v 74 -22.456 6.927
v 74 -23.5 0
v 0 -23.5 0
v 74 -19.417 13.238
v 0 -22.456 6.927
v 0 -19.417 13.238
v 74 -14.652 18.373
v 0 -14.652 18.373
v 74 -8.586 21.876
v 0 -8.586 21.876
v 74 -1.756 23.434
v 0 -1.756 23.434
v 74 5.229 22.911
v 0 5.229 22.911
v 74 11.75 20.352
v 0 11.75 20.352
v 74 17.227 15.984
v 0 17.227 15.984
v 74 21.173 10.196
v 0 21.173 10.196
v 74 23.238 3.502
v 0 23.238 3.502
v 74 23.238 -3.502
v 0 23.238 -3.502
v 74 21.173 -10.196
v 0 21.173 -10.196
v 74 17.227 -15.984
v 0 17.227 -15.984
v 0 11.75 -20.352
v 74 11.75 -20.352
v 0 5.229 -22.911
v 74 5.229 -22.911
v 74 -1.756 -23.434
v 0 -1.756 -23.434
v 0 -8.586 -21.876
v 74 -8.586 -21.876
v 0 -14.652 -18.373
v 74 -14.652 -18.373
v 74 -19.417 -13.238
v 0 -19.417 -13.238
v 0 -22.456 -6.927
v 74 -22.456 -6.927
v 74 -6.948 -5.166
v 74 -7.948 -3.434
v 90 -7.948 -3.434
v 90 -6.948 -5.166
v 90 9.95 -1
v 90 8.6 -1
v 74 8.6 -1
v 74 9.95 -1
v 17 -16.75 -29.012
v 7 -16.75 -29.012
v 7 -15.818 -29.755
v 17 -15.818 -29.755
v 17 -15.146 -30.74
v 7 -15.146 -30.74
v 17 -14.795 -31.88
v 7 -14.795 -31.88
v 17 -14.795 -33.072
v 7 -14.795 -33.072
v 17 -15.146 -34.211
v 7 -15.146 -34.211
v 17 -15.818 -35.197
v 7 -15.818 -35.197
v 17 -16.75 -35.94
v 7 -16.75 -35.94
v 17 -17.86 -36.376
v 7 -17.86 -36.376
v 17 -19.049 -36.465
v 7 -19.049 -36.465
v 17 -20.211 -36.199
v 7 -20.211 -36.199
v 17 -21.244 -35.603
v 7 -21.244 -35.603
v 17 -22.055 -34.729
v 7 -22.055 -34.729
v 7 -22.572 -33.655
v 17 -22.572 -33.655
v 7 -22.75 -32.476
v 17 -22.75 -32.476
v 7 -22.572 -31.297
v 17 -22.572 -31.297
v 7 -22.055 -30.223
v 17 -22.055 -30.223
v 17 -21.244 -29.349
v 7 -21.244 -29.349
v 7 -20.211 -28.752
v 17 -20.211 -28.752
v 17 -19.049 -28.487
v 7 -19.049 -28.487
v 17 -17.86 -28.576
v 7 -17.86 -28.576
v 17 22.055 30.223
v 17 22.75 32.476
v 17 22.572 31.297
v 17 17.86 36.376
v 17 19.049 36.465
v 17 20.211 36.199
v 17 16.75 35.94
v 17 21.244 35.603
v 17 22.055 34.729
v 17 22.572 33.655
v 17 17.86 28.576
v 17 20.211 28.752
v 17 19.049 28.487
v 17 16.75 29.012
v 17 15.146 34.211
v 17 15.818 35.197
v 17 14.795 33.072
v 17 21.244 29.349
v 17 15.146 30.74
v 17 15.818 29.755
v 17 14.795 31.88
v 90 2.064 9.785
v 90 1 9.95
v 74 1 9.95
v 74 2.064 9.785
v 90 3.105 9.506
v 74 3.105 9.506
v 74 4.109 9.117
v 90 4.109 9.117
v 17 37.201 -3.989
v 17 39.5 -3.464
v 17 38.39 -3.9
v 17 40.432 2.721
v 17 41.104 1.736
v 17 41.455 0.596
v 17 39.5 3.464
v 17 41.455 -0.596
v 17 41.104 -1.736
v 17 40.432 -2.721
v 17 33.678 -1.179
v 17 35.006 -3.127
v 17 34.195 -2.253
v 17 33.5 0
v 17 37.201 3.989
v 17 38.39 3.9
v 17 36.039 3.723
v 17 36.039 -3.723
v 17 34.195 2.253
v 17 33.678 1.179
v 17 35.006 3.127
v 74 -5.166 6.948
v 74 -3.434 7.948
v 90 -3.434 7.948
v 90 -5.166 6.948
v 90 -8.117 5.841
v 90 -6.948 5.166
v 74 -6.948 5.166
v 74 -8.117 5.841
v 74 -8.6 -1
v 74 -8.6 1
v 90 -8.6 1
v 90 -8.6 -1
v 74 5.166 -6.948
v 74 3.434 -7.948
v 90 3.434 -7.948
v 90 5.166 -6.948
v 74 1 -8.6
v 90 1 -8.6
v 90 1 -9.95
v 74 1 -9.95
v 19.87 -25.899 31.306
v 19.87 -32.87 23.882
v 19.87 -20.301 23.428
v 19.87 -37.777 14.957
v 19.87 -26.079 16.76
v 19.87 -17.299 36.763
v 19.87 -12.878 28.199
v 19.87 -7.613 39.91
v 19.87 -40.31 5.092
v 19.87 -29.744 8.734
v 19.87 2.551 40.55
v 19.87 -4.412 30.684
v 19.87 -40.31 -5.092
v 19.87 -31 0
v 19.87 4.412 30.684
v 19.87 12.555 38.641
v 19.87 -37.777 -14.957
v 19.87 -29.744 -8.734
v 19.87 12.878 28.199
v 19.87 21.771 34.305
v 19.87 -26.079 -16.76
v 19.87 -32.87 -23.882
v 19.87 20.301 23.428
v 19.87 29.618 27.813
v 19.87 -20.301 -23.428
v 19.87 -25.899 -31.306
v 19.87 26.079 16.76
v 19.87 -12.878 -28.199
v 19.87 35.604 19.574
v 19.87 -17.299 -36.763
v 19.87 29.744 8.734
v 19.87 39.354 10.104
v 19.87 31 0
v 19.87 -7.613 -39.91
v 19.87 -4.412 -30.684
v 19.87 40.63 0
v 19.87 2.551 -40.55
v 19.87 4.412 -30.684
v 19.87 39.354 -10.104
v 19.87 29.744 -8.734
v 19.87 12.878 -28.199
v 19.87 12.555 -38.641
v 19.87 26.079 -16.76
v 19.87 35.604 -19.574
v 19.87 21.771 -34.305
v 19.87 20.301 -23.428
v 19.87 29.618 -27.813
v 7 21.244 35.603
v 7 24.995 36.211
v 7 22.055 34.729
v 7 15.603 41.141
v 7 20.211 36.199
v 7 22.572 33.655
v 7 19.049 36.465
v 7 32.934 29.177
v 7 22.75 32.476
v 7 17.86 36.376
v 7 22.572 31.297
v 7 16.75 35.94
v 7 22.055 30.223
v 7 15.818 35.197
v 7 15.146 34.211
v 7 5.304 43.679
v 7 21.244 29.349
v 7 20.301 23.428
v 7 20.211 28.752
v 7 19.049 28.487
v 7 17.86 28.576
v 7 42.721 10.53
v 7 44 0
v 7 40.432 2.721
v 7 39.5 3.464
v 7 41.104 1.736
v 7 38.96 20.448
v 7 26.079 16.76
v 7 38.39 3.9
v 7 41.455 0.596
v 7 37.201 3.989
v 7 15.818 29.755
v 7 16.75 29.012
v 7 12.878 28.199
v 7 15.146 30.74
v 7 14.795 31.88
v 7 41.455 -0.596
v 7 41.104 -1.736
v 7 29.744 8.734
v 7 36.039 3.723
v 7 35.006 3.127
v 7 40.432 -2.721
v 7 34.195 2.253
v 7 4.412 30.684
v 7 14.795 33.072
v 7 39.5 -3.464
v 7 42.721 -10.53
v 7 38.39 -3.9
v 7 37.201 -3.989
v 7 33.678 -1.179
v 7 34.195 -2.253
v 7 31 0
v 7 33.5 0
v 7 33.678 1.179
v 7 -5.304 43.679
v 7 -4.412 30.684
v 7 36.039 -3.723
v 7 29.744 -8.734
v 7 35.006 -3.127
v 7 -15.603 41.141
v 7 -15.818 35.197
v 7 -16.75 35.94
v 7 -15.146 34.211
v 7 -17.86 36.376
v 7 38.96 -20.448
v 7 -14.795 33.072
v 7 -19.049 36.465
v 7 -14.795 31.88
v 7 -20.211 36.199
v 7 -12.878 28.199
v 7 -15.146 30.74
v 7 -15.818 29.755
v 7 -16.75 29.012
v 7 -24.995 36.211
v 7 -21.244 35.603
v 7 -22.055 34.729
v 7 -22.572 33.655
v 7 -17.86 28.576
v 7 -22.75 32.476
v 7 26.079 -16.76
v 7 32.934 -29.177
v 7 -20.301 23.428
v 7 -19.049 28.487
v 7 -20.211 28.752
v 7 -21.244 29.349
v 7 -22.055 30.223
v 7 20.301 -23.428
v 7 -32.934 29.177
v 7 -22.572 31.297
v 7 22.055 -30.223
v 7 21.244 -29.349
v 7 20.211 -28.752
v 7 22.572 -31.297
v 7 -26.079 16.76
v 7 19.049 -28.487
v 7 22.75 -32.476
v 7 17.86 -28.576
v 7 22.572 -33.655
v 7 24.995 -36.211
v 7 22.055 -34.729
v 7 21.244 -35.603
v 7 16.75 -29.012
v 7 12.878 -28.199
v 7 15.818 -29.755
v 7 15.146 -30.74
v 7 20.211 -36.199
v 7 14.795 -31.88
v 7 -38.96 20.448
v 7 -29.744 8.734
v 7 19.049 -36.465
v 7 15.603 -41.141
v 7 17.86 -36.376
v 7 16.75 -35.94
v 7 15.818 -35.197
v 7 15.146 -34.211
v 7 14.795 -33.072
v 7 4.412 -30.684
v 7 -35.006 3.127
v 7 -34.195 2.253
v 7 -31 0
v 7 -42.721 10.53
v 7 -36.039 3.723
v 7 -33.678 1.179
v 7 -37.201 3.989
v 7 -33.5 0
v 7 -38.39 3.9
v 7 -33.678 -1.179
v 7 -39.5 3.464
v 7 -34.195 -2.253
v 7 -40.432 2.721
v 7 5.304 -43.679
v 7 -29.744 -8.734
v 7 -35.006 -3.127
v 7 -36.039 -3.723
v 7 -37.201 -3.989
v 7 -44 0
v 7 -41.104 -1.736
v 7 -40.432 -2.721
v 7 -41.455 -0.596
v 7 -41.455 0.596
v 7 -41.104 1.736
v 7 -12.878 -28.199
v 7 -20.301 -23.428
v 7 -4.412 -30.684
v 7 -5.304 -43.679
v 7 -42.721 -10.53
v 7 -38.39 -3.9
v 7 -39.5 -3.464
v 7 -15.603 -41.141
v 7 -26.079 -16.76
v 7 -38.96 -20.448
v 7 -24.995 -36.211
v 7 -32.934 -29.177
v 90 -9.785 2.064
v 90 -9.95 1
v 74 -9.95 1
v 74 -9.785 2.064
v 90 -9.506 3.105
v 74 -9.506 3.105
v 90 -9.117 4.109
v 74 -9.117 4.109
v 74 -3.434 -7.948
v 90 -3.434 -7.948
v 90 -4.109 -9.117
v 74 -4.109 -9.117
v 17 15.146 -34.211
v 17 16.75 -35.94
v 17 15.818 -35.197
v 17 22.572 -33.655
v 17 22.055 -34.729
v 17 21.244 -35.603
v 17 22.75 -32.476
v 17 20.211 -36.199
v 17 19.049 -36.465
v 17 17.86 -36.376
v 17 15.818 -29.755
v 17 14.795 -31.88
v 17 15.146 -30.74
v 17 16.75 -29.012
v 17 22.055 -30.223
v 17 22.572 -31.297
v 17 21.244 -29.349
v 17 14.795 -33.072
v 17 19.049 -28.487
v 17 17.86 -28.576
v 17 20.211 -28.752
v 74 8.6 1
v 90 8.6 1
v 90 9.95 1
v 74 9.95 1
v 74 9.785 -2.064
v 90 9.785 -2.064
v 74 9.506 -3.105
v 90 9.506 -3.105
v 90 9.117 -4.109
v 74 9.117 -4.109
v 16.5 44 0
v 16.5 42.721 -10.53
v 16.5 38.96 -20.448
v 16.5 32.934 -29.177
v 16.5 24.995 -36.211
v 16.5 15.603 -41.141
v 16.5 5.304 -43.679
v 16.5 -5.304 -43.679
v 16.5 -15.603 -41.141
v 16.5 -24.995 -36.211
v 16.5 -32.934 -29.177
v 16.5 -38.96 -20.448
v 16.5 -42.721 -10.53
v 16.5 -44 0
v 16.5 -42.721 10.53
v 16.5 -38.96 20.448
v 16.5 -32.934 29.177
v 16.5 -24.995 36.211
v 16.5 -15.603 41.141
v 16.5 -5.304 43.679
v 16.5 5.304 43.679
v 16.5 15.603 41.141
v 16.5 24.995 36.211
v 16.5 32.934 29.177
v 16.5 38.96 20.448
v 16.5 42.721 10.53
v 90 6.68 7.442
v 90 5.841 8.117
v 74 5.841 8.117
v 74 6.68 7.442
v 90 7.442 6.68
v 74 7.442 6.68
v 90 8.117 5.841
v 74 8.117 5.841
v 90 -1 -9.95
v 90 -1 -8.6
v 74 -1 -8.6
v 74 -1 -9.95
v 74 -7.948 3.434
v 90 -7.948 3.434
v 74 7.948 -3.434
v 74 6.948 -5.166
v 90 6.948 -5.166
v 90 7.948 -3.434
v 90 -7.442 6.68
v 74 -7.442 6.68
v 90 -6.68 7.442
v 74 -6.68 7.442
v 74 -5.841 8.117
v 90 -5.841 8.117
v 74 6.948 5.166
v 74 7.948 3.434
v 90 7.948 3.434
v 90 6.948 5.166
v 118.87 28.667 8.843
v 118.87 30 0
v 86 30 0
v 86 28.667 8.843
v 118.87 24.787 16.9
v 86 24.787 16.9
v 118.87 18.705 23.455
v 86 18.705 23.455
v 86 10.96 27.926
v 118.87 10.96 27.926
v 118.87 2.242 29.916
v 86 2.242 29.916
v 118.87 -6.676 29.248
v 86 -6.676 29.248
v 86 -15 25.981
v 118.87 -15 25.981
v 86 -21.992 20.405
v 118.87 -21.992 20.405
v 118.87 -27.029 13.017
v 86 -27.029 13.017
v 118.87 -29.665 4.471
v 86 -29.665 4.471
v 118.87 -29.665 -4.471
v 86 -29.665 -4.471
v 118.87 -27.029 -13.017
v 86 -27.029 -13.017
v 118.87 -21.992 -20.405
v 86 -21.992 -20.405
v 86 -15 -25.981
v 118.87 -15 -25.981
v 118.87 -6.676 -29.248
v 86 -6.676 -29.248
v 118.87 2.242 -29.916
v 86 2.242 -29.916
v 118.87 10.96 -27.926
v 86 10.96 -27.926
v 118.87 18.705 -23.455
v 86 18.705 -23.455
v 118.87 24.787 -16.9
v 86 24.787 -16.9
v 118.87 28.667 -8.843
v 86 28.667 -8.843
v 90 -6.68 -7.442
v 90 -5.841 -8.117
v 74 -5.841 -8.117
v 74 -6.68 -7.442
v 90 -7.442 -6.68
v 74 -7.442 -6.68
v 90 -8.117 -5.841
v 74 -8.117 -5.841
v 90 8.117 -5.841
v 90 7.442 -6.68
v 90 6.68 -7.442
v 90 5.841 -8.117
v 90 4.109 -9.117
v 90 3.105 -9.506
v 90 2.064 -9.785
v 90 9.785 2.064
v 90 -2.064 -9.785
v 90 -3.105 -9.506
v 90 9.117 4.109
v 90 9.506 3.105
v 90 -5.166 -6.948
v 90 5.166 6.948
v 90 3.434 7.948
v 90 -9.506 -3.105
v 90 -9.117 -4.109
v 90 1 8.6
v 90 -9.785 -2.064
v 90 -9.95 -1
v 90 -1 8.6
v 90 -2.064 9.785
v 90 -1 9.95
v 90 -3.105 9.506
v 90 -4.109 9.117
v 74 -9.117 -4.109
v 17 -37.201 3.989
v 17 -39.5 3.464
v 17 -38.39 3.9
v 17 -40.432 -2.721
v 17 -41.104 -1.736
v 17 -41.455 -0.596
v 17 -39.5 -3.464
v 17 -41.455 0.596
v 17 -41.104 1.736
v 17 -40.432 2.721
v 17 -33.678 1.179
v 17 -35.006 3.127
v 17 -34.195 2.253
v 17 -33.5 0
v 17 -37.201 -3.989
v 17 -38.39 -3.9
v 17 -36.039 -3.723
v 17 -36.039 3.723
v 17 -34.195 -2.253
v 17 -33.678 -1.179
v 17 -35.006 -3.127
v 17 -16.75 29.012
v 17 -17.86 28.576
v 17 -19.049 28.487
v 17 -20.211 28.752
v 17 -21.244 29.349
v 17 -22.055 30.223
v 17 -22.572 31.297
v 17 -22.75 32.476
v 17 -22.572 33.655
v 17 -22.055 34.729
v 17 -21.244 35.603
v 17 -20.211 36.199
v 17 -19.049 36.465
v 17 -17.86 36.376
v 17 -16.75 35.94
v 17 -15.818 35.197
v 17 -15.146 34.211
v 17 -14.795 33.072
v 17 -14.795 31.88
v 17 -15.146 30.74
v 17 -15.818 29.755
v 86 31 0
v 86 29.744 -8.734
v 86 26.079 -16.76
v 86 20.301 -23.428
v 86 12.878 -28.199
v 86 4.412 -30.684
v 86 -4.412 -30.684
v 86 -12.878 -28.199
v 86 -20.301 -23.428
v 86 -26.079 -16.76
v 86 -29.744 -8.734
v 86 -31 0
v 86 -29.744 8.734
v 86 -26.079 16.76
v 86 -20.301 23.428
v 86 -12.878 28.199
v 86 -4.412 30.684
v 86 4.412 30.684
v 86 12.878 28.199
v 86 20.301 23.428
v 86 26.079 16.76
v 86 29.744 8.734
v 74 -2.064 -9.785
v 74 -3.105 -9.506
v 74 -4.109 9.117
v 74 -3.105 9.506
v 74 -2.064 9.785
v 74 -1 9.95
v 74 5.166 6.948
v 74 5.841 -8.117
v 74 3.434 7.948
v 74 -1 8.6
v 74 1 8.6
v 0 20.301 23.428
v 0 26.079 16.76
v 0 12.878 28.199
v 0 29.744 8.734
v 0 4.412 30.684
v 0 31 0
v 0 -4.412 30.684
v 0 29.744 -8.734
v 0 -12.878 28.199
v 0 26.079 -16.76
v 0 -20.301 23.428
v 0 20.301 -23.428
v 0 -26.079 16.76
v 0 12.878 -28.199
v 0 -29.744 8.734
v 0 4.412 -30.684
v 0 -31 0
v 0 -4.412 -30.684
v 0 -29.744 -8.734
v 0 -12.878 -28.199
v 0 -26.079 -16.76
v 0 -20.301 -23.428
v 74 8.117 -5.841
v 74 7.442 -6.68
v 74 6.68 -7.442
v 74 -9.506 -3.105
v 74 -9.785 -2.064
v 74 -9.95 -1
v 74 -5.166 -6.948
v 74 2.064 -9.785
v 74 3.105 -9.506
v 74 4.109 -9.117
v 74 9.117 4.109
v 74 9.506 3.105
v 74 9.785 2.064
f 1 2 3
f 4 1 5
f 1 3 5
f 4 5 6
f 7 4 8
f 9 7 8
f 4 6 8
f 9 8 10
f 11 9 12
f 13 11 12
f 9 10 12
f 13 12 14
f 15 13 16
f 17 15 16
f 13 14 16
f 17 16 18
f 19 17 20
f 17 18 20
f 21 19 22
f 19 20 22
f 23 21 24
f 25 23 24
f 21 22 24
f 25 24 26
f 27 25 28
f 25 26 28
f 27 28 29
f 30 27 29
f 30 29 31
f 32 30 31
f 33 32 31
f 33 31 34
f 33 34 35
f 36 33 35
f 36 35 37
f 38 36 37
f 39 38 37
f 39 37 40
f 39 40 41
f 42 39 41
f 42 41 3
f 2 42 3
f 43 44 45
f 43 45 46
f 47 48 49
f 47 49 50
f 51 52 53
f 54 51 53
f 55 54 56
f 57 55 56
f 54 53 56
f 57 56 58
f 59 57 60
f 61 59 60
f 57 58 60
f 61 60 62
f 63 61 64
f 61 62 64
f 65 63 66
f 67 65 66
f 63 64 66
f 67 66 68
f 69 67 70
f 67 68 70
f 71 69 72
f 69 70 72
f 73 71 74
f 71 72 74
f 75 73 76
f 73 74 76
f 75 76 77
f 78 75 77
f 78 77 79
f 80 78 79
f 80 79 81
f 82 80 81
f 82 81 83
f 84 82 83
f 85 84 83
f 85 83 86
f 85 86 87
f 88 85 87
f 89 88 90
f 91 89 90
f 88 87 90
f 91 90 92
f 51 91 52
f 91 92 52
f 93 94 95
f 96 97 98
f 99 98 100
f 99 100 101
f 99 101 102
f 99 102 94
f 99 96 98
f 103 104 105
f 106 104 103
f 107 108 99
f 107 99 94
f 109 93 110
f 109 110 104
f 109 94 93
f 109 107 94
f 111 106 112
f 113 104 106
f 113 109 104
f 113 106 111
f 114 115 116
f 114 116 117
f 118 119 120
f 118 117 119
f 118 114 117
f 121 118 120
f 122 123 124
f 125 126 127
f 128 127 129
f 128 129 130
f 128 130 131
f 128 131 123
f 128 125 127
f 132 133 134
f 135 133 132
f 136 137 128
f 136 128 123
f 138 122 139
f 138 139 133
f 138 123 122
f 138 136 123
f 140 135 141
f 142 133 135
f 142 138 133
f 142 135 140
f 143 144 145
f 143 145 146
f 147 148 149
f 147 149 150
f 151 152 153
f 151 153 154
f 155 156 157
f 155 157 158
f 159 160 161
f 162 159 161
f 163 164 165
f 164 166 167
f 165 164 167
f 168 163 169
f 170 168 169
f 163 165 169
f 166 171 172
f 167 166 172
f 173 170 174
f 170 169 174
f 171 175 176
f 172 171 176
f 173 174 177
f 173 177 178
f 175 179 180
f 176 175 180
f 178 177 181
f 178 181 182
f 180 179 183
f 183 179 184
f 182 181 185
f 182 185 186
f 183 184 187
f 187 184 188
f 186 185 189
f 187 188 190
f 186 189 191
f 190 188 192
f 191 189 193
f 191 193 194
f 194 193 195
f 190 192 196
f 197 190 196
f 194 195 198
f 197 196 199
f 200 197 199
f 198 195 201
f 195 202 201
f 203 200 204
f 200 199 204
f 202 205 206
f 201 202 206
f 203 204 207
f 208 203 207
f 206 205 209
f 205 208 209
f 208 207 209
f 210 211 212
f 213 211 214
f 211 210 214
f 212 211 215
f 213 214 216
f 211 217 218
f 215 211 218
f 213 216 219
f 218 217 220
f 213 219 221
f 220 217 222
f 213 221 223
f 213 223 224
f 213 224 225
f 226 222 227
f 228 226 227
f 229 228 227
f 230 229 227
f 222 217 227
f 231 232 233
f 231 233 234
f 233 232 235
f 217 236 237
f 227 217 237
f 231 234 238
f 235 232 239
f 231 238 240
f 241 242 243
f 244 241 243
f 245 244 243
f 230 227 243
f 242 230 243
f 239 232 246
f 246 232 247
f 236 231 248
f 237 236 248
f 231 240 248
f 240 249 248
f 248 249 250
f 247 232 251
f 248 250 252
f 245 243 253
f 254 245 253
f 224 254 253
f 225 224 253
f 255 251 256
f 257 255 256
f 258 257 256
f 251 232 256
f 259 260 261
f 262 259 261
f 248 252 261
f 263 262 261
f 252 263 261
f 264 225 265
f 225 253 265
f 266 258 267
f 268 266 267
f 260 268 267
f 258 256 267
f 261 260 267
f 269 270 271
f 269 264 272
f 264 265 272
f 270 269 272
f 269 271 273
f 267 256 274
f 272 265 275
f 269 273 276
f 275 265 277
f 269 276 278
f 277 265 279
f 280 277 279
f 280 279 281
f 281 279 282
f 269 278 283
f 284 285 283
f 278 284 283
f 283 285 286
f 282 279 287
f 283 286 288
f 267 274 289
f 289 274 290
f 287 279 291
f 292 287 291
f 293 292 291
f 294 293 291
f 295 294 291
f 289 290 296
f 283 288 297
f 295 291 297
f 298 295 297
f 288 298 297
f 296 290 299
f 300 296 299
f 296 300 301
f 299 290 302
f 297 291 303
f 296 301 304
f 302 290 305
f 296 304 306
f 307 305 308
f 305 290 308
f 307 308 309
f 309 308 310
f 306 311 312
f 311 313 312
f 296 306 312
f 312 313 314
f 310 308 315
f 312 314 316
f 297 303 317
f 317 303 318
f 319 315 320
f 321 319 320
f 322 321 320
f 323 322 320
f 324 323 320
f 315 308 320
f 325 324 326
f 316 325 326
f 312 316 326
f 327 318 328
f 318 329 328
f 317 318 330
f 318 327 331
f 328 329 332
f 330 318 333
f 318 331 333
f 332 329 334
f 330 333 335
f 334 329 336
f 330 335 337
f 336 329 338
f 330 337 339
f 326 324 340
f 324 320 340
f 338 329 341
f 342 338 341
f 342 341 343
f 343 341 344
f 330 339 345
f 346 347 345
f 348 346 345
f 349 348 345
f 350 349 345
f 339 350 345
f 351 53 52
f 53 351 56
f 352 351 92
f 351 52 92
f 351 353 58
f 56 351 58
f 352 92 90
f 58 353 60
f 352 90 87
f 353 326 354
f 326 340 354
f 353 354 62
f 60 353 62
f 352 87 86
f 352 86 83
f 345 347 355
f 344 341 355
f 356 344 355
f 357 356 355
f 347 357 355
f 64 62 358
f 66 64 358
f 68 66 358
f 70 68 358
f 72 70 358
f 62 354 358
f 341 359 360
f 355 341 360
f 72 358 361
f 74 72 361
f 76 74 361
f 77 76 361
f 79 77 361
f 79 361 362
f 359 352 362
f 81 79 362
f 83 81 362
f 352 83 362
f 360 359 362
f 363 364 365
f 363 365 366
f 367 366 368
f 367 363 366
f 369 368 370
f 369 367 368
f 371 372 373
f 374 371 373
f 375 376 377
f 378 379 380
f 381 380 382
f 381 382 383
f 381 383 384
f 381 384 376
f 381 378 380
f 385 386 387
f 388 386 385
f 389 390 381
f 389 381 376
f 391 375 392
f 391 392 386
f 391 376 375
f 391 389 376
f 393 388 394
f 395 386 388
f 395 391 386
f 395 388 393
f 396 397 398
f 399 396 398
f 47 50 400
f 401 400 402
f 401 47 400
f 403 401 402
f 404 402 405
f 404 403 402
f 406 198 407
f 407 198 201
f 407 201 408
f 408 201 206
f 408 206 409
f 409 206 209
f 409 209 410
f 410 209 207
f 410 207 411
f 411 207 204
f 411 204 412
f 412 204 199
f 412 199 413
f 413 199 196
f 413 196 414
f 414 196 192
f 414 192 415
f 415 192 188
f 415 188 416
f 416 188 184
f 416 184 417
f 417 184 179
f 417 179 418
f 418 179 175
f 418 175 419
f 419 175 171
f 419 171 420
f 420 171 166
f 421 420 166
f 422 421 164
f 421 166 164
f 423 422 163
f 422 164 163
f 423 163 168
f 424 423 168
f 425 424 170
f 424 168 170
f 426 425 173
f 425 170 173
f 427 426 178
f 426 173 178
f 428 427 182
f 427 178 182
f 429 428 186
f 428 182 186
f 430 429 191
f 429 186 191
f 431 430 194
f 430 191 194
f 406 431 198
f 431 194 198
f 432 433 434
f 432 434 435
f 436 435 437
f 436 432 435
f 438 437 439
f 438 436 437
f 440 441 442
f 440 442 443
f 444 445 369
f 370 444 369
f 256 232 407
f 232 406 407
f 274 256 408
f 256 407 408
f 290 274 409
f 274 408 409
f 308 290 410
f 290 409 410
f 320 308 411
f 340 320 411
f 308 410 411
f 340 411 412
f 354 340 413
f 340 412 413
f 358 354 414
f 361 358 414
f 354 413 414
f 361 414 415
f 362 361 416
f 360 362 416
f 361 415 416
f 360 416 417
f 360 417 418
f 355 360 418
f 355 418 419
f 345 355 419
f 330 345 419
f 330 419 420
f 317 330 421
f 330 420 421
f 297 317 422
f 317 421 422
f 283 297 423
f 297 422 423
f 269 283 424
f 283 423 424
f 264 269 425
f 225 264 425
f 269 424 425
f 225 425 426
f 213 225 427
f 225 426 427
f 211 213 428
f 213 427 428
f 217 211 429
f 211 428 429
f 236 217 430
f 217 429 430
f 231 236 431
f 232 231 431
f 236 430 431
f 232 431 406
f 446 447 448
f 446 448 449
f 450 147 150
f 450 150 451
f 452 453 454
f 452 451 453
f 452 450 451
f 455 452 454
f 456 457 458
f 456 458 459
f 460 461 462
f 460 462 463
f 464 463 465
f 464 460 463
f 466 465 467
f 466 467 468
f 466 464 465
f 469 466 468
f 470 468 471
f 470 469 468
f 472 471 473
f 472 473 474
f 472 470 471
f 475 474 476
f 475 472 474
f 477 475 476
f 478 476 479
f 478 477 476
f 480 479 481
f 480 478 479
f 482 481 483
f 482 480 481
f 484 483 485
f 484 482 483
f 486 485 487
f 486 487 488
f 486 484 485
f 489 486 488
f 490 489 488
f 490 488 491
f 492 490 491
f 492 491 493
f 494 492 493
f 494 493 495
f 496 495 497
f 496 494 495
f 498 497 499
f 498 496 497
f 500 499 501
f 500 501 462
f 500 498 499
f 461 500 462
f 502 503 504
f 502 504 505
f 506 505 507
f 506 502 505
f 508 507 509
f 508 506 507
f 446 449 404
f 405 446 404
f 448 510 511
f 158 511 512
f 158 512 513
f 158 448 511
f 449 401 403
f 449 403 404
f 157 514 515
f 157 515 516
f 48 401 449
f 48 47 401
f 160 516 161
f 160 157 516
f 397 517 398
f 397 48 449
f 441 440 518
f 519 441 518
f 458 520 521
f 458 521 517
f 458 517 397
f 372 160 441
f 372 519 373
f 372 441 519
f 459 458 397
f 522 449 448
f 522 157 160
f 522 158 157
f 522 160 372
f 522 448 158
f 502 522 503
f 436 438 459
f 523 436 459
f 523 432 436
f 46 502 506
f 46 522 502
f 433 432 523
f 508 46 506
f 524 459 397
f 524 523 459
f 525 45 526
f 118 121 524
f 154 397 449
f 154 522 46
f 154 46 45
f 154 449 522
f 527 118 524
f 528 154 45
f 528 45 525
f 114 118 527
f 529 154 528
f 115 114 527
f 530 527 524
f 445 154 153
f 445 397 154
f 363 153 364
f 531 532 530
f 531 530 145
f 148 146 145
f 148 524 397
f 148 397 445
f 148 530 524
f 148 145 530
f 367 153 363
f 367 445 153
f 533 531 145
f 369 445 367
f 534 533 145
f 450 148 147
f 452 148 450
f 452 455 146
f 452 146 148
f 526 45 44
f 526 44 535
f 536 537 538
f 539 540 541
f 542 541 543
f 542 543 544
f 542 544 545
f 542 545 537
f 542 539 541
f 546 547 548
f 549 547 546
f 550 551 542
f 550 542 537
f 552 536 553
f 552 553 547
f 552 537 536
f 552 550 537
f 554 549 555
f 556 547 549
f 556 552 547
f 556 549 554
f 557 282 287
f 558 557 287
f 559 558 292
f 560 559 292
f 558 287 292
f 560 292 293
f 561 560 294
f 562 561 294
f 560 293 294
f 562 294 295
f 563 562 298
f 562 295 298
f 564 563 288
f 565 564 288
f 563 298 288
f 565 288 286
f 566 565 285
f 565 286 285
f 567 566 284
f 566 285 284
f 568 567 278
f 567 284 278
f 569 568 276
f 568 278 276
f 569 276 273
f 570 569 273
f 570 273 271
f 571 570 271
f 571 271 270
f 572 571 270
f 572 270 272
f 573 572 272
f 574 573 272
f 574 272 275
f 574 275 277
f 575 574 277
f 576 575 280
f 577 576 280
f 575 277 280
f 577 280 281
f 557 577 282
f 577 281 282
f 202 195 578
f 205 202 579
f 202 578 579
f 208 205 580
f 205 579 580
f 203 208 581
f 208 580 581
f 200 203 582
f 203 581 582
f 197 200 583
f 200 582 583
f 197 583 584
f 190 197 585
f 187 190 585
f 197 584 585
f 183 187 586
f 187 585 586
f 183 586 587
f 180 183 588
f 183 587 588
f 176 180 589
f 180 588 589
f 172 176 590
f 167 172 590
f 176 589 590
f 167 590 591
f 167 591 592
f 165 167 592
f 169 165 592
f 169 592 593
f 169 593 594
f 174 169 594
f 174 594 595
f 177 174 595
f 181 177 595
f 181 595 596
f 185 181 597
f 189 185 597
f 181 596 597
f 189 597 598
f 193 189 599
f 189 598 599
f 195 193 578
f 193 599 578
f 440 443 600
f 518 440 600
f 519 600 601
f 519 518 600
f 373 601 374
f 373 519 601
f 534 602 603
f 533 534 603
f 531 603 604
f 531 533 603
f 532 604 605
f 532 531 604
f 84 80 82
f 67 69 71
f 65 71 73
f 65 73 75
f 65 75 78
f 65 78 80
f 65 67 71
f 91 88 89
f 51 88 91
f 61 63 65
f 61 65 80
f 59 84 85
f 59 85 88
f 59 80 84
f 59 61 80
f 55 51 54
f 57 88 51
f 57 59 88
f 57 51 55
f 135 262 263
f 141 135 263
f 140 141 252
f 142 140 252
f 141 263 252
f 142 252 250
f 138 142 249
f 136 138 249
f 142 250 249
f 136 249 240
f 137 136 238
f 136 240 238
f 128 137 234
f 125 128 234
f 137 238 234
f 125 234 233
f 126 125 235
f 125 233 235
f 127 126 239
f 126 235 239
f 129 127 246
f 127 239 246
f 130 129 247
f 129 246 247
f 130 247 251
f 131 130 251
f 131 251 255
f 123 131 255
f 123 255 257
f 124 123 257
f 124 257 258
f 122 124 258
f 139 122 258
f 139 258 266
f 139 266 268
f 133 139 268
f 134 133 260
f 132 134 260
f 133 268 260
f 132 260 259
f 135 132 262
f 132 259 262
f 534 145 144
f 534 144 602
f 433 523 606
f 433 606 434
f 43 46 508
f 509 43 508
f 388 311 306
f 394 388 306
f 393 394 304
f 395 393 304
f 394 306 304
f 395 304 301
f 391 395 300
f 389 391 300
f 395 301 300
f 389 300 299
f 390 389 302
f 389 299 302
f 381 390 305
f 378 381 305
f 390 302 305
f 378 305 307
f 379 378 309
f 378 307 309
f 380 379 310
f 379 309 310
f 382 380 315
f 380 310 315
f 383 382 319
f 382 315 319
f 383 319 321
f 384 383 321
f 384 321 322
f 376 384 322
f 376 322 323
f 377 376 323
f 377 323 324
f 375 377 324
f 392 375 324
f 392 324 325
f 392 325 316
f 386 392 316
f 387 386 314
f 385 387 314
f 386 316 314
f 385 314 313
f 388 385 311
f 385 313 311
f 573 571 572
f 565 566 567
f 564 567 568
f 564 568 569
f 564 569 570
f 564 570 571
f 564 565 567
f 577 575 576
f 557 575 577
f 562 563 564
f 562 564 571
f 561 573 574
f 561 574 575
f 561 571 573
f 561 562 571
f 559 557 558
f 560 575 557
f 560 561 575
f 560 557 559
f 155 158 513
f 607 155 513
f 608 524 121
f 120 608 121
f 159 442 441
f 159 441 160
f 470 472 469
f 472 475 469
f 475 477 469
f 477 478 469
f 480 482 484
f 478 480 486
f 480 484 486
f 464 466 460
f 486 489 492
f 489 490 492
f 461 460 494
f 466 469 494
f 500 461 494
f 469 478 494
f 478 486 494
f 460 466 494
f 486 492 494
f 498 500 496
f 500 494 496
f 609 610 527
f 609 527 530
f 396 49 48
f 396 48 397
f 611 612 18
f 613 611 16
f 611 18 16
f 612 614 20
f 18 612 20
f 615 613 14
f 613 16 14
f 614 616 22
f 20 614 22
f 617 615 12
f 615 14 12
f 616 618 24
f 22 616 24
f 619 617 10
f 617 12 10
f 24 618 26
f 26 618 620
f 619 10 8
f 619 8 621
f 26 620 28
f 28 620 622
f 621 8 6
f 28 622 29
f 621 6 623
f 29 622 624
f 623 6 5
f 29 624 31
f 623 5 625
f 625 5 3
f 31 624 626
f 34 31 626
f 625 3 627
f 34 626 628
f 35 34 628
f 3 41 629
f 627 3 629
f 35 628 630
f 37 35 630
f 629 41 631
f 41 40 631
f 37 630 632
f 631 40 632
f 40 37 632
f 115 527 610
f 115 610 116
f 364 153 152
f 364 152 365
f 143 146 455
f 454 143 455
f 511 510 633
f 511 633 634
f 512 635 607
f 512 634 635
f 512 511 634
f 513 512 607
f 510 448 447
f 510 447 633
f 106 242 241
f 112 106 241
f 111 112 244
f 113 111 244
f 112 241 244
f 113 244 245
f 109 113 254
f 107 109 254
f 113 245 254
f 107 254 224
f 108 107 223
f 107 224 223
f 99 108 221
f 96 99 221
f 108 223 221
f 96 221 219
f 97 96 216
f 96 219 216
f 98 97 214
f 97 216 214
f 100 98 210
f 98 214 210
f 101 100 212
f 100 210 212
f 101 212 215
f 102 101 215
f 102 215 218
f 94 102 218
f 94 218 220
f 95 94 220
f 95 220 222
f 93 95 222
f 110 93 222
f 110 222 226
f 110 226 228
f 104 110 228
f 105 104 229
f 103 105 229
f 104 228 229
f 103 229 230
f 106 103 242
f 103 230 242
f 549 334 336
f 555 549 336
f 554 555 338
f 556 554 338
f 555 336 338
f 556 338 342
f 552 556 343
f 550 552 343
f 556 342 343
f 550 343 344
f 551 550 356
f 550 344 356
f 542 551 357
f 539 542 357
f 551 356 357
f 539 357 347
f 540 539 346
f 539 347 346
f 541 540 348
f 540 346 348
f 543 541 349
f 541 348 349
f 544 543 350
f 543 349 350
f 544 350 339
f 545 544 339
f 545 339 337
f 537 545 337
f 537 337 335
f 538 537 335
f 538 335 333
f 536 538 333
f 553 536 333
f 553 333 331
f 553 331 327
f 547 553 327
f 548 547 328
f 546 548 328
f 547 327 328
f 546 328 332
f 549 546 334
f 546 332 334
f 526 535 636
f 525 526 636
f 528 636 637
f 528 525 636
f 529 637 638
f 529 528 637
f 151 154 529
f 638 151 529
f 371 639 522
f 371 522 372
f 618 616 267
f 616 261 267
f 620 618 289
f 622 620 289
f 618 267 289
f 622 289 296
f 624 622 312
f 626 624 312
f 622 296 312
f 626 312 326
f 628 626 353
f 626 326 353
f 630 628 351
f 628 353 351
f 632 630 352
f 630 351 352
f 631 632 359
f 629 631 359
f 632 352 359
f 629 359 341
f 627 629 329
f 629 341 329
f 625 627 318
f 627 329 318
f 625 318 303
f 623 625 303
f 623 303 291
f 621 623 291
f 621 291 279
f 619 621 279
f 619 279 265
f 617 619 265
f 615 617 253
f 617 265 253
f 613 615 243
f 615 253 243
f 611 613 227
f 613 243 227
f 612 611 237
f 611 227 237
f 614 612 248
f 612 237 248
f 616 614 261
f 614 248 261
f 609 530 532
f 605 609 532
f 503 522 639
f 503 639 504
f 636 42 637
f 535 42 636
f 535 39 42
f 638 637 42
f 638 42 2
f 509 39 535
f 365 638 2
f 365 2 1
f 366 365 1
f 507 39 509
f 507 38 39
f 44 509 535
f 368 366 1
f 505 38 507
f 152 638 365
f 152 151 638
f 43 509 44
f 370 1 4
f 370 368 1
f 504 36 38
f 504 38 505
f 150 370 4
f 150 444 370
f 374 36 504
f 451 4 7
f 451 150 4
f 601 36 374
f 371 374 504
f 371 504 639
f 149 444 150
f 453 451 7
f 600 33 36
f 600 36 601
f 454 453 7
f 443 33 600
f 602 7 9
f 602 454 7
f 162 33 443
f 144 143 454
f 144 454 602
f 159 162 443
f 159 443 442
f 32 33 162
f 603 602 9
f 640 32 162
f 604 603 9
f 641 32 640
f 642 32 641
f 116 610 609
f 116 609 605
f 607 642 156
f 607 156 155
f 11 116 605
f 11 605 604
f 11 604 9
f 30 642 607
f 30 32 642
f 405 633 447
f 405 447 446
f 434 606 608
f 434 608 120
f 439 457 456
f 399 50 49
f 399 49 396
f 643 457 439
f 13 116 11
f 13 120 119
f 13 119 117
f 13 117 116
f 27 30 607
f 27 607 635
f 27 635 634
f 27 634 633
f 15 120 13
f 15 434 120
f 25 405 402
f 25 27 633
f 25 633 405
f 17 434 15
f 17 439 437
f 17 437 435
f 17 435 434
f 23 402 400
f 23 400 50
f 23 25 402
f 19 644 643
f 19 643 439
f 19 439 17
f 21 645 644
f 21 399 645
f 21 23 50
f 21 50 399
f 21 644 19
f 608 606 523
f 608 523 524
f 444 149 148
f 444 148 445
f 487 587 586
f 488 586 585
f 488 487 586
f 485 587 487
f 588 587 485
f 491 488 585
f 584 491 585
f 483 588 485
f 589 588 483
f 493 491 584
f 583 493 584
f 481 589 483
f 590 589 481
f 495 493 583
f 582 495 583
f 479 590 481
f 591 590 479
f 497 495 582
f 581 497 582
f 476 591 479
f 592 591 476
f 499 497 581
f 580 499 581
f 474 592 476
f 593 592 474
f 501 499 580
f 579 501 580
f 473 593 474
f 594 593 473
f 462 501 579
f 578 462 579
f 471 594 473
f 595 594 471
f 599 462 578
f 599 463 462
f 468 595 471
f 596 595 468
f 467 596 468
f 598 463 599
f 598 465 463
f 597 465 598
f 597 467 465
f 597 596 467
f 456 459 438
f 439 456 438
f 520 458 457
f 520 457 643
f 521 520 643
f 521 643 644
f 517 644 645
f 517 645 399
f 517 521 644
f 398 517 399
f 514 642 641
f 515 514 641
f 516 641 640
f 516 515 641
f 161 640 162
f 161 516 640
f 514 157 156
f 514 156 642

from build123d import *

# Parameters (mm, degrees)
SKETCH3_R           = 4
CUT_EXTRUDE5_DEPTH  = 10
CIRPATTERN1_COUNT   = 6
SKETCH4_R           = 23.5
CUT_EXTRUDE6_DEPTH  = 90
SKETCH5_W           = 16
SKETCH5_H           = 16
BOSS_EXTRUDE1_START = -16
SKETCH6_W           = 2
SKETCH6_H           = 2.4
BOSS_EXTRUDE1_DEPTH = 16
CIRPATTERN2_COUNT   = 12
SKETCH7_R           = 31
SKETCH7_R_2         = 30
CUT_EXTRUDE7_DEPTH  = 32.87


with BuildPart() as part:
    # Sketch1 → Revolve1 (revolve)
    with BuildSketch(Plane.XY):
        Polygon((0, 0), (0, 31), (7, 31), (7, 44), (16.5, 44), (19.87, 40.63), (19.87, 31), (118.87, 31), (118.87, 0), align=None)
    revolve(axis=Axis((118.87, 0, 0), (-1, 0, 0)))

    # Sketch3 → Cut-Extrude5 (cut)
    with BuildSketch(Plane.ZY.offset(-7)):
        with Locations(Location((0, 37.5, 0), (0, 0, 270))):
            Circle(SKETCH3_R)
    cut_extrude5 = extrude(amount=-CUT_EXTRUDE5_DEPTH, mode=Mode.SUBTRACT)

    # CirPattern1: Cut-Extrude5 ×6 about axis
    cirpattern1_axis = Axis((0, 0, 0), (1, 0, 0))
    for i in range(1, CIRPATTERN1_COUNT):
        add(cut_extrude5.rotate(cirpattern1_axis, i * 360 / CIRPATTERN1_COUNT), mode=Mode.SUBTRACT)

    # Sketch4 → Cut-Extrude6 (cut)
    with BuildSketch(Plane.ZY):
        with Locations(Location((0, 0, 0), (0, 0, 270))):
            Circle(SKETCH4_R)
    extrude(amount=-CUT_EXTRUDE6_DEPTH, mode=Mode.SUBTRACT)

    # Sketch5 → Revolve2 (revolve)
    with BuildSketch(Plane.XY, mode=Mode.PRIVATE) as revolve2_sk:
        with Locations((82, 18)):
            Rectangle(SKETCH5_W, SKETCH5_H)
    revolve(revolve2_sk.sketch.rotate(Axis((118.87, 0, 0), (-1, 0, 0)), 180), axis=Axis((118.87, 0, 0), (-1, 0, 0)))

    # Sketch6 → Boss-Extrude1 (add)
    with BuildSketch(Plane.ZY.offset(-74).offset(BOSS_EXTRUDE1_START)):
        with Locations((0, 9.8)):
            Rectangle(SKETCH6_W, SKETCH6_H)
    boss_extrude1 = extrude(amount=BOSS_EXTRUDE1_DEPTH)

    # CirPattern2: Boss-Extrude1 ×12 about axis
    cirpattern2_axis = Axis((0, 0, 0), (1, 0, 0))
    for i in range(1, CIRPATTERN2_COUNT):
        add(boss_extrude1.rotate(cirpattern2_axis, i * 360 / CIRPATTERN2_COUNT))

    # Sketch7 → Cut-Extrude7 (cut)
    with BuildSketch(Plane(origin=(118.87, 0, 0), x_dir=(0, 0, -1), z_dir=(1, 0, 0))):
        with Locations(Location((0, 0, 0), (0, 0, 90))):
            Circle(SKETCH7_R)
        with Locations(Location((0, 0, 0), (0, 0, 90))):
            Circle(SKETCH7_R_2, mode=Mode.SUBTRACT)
    extrude(amount=-CUT_EXTRUDE7_DEPTH, mode=Mode.SUBTRACT)


solid = part.part
